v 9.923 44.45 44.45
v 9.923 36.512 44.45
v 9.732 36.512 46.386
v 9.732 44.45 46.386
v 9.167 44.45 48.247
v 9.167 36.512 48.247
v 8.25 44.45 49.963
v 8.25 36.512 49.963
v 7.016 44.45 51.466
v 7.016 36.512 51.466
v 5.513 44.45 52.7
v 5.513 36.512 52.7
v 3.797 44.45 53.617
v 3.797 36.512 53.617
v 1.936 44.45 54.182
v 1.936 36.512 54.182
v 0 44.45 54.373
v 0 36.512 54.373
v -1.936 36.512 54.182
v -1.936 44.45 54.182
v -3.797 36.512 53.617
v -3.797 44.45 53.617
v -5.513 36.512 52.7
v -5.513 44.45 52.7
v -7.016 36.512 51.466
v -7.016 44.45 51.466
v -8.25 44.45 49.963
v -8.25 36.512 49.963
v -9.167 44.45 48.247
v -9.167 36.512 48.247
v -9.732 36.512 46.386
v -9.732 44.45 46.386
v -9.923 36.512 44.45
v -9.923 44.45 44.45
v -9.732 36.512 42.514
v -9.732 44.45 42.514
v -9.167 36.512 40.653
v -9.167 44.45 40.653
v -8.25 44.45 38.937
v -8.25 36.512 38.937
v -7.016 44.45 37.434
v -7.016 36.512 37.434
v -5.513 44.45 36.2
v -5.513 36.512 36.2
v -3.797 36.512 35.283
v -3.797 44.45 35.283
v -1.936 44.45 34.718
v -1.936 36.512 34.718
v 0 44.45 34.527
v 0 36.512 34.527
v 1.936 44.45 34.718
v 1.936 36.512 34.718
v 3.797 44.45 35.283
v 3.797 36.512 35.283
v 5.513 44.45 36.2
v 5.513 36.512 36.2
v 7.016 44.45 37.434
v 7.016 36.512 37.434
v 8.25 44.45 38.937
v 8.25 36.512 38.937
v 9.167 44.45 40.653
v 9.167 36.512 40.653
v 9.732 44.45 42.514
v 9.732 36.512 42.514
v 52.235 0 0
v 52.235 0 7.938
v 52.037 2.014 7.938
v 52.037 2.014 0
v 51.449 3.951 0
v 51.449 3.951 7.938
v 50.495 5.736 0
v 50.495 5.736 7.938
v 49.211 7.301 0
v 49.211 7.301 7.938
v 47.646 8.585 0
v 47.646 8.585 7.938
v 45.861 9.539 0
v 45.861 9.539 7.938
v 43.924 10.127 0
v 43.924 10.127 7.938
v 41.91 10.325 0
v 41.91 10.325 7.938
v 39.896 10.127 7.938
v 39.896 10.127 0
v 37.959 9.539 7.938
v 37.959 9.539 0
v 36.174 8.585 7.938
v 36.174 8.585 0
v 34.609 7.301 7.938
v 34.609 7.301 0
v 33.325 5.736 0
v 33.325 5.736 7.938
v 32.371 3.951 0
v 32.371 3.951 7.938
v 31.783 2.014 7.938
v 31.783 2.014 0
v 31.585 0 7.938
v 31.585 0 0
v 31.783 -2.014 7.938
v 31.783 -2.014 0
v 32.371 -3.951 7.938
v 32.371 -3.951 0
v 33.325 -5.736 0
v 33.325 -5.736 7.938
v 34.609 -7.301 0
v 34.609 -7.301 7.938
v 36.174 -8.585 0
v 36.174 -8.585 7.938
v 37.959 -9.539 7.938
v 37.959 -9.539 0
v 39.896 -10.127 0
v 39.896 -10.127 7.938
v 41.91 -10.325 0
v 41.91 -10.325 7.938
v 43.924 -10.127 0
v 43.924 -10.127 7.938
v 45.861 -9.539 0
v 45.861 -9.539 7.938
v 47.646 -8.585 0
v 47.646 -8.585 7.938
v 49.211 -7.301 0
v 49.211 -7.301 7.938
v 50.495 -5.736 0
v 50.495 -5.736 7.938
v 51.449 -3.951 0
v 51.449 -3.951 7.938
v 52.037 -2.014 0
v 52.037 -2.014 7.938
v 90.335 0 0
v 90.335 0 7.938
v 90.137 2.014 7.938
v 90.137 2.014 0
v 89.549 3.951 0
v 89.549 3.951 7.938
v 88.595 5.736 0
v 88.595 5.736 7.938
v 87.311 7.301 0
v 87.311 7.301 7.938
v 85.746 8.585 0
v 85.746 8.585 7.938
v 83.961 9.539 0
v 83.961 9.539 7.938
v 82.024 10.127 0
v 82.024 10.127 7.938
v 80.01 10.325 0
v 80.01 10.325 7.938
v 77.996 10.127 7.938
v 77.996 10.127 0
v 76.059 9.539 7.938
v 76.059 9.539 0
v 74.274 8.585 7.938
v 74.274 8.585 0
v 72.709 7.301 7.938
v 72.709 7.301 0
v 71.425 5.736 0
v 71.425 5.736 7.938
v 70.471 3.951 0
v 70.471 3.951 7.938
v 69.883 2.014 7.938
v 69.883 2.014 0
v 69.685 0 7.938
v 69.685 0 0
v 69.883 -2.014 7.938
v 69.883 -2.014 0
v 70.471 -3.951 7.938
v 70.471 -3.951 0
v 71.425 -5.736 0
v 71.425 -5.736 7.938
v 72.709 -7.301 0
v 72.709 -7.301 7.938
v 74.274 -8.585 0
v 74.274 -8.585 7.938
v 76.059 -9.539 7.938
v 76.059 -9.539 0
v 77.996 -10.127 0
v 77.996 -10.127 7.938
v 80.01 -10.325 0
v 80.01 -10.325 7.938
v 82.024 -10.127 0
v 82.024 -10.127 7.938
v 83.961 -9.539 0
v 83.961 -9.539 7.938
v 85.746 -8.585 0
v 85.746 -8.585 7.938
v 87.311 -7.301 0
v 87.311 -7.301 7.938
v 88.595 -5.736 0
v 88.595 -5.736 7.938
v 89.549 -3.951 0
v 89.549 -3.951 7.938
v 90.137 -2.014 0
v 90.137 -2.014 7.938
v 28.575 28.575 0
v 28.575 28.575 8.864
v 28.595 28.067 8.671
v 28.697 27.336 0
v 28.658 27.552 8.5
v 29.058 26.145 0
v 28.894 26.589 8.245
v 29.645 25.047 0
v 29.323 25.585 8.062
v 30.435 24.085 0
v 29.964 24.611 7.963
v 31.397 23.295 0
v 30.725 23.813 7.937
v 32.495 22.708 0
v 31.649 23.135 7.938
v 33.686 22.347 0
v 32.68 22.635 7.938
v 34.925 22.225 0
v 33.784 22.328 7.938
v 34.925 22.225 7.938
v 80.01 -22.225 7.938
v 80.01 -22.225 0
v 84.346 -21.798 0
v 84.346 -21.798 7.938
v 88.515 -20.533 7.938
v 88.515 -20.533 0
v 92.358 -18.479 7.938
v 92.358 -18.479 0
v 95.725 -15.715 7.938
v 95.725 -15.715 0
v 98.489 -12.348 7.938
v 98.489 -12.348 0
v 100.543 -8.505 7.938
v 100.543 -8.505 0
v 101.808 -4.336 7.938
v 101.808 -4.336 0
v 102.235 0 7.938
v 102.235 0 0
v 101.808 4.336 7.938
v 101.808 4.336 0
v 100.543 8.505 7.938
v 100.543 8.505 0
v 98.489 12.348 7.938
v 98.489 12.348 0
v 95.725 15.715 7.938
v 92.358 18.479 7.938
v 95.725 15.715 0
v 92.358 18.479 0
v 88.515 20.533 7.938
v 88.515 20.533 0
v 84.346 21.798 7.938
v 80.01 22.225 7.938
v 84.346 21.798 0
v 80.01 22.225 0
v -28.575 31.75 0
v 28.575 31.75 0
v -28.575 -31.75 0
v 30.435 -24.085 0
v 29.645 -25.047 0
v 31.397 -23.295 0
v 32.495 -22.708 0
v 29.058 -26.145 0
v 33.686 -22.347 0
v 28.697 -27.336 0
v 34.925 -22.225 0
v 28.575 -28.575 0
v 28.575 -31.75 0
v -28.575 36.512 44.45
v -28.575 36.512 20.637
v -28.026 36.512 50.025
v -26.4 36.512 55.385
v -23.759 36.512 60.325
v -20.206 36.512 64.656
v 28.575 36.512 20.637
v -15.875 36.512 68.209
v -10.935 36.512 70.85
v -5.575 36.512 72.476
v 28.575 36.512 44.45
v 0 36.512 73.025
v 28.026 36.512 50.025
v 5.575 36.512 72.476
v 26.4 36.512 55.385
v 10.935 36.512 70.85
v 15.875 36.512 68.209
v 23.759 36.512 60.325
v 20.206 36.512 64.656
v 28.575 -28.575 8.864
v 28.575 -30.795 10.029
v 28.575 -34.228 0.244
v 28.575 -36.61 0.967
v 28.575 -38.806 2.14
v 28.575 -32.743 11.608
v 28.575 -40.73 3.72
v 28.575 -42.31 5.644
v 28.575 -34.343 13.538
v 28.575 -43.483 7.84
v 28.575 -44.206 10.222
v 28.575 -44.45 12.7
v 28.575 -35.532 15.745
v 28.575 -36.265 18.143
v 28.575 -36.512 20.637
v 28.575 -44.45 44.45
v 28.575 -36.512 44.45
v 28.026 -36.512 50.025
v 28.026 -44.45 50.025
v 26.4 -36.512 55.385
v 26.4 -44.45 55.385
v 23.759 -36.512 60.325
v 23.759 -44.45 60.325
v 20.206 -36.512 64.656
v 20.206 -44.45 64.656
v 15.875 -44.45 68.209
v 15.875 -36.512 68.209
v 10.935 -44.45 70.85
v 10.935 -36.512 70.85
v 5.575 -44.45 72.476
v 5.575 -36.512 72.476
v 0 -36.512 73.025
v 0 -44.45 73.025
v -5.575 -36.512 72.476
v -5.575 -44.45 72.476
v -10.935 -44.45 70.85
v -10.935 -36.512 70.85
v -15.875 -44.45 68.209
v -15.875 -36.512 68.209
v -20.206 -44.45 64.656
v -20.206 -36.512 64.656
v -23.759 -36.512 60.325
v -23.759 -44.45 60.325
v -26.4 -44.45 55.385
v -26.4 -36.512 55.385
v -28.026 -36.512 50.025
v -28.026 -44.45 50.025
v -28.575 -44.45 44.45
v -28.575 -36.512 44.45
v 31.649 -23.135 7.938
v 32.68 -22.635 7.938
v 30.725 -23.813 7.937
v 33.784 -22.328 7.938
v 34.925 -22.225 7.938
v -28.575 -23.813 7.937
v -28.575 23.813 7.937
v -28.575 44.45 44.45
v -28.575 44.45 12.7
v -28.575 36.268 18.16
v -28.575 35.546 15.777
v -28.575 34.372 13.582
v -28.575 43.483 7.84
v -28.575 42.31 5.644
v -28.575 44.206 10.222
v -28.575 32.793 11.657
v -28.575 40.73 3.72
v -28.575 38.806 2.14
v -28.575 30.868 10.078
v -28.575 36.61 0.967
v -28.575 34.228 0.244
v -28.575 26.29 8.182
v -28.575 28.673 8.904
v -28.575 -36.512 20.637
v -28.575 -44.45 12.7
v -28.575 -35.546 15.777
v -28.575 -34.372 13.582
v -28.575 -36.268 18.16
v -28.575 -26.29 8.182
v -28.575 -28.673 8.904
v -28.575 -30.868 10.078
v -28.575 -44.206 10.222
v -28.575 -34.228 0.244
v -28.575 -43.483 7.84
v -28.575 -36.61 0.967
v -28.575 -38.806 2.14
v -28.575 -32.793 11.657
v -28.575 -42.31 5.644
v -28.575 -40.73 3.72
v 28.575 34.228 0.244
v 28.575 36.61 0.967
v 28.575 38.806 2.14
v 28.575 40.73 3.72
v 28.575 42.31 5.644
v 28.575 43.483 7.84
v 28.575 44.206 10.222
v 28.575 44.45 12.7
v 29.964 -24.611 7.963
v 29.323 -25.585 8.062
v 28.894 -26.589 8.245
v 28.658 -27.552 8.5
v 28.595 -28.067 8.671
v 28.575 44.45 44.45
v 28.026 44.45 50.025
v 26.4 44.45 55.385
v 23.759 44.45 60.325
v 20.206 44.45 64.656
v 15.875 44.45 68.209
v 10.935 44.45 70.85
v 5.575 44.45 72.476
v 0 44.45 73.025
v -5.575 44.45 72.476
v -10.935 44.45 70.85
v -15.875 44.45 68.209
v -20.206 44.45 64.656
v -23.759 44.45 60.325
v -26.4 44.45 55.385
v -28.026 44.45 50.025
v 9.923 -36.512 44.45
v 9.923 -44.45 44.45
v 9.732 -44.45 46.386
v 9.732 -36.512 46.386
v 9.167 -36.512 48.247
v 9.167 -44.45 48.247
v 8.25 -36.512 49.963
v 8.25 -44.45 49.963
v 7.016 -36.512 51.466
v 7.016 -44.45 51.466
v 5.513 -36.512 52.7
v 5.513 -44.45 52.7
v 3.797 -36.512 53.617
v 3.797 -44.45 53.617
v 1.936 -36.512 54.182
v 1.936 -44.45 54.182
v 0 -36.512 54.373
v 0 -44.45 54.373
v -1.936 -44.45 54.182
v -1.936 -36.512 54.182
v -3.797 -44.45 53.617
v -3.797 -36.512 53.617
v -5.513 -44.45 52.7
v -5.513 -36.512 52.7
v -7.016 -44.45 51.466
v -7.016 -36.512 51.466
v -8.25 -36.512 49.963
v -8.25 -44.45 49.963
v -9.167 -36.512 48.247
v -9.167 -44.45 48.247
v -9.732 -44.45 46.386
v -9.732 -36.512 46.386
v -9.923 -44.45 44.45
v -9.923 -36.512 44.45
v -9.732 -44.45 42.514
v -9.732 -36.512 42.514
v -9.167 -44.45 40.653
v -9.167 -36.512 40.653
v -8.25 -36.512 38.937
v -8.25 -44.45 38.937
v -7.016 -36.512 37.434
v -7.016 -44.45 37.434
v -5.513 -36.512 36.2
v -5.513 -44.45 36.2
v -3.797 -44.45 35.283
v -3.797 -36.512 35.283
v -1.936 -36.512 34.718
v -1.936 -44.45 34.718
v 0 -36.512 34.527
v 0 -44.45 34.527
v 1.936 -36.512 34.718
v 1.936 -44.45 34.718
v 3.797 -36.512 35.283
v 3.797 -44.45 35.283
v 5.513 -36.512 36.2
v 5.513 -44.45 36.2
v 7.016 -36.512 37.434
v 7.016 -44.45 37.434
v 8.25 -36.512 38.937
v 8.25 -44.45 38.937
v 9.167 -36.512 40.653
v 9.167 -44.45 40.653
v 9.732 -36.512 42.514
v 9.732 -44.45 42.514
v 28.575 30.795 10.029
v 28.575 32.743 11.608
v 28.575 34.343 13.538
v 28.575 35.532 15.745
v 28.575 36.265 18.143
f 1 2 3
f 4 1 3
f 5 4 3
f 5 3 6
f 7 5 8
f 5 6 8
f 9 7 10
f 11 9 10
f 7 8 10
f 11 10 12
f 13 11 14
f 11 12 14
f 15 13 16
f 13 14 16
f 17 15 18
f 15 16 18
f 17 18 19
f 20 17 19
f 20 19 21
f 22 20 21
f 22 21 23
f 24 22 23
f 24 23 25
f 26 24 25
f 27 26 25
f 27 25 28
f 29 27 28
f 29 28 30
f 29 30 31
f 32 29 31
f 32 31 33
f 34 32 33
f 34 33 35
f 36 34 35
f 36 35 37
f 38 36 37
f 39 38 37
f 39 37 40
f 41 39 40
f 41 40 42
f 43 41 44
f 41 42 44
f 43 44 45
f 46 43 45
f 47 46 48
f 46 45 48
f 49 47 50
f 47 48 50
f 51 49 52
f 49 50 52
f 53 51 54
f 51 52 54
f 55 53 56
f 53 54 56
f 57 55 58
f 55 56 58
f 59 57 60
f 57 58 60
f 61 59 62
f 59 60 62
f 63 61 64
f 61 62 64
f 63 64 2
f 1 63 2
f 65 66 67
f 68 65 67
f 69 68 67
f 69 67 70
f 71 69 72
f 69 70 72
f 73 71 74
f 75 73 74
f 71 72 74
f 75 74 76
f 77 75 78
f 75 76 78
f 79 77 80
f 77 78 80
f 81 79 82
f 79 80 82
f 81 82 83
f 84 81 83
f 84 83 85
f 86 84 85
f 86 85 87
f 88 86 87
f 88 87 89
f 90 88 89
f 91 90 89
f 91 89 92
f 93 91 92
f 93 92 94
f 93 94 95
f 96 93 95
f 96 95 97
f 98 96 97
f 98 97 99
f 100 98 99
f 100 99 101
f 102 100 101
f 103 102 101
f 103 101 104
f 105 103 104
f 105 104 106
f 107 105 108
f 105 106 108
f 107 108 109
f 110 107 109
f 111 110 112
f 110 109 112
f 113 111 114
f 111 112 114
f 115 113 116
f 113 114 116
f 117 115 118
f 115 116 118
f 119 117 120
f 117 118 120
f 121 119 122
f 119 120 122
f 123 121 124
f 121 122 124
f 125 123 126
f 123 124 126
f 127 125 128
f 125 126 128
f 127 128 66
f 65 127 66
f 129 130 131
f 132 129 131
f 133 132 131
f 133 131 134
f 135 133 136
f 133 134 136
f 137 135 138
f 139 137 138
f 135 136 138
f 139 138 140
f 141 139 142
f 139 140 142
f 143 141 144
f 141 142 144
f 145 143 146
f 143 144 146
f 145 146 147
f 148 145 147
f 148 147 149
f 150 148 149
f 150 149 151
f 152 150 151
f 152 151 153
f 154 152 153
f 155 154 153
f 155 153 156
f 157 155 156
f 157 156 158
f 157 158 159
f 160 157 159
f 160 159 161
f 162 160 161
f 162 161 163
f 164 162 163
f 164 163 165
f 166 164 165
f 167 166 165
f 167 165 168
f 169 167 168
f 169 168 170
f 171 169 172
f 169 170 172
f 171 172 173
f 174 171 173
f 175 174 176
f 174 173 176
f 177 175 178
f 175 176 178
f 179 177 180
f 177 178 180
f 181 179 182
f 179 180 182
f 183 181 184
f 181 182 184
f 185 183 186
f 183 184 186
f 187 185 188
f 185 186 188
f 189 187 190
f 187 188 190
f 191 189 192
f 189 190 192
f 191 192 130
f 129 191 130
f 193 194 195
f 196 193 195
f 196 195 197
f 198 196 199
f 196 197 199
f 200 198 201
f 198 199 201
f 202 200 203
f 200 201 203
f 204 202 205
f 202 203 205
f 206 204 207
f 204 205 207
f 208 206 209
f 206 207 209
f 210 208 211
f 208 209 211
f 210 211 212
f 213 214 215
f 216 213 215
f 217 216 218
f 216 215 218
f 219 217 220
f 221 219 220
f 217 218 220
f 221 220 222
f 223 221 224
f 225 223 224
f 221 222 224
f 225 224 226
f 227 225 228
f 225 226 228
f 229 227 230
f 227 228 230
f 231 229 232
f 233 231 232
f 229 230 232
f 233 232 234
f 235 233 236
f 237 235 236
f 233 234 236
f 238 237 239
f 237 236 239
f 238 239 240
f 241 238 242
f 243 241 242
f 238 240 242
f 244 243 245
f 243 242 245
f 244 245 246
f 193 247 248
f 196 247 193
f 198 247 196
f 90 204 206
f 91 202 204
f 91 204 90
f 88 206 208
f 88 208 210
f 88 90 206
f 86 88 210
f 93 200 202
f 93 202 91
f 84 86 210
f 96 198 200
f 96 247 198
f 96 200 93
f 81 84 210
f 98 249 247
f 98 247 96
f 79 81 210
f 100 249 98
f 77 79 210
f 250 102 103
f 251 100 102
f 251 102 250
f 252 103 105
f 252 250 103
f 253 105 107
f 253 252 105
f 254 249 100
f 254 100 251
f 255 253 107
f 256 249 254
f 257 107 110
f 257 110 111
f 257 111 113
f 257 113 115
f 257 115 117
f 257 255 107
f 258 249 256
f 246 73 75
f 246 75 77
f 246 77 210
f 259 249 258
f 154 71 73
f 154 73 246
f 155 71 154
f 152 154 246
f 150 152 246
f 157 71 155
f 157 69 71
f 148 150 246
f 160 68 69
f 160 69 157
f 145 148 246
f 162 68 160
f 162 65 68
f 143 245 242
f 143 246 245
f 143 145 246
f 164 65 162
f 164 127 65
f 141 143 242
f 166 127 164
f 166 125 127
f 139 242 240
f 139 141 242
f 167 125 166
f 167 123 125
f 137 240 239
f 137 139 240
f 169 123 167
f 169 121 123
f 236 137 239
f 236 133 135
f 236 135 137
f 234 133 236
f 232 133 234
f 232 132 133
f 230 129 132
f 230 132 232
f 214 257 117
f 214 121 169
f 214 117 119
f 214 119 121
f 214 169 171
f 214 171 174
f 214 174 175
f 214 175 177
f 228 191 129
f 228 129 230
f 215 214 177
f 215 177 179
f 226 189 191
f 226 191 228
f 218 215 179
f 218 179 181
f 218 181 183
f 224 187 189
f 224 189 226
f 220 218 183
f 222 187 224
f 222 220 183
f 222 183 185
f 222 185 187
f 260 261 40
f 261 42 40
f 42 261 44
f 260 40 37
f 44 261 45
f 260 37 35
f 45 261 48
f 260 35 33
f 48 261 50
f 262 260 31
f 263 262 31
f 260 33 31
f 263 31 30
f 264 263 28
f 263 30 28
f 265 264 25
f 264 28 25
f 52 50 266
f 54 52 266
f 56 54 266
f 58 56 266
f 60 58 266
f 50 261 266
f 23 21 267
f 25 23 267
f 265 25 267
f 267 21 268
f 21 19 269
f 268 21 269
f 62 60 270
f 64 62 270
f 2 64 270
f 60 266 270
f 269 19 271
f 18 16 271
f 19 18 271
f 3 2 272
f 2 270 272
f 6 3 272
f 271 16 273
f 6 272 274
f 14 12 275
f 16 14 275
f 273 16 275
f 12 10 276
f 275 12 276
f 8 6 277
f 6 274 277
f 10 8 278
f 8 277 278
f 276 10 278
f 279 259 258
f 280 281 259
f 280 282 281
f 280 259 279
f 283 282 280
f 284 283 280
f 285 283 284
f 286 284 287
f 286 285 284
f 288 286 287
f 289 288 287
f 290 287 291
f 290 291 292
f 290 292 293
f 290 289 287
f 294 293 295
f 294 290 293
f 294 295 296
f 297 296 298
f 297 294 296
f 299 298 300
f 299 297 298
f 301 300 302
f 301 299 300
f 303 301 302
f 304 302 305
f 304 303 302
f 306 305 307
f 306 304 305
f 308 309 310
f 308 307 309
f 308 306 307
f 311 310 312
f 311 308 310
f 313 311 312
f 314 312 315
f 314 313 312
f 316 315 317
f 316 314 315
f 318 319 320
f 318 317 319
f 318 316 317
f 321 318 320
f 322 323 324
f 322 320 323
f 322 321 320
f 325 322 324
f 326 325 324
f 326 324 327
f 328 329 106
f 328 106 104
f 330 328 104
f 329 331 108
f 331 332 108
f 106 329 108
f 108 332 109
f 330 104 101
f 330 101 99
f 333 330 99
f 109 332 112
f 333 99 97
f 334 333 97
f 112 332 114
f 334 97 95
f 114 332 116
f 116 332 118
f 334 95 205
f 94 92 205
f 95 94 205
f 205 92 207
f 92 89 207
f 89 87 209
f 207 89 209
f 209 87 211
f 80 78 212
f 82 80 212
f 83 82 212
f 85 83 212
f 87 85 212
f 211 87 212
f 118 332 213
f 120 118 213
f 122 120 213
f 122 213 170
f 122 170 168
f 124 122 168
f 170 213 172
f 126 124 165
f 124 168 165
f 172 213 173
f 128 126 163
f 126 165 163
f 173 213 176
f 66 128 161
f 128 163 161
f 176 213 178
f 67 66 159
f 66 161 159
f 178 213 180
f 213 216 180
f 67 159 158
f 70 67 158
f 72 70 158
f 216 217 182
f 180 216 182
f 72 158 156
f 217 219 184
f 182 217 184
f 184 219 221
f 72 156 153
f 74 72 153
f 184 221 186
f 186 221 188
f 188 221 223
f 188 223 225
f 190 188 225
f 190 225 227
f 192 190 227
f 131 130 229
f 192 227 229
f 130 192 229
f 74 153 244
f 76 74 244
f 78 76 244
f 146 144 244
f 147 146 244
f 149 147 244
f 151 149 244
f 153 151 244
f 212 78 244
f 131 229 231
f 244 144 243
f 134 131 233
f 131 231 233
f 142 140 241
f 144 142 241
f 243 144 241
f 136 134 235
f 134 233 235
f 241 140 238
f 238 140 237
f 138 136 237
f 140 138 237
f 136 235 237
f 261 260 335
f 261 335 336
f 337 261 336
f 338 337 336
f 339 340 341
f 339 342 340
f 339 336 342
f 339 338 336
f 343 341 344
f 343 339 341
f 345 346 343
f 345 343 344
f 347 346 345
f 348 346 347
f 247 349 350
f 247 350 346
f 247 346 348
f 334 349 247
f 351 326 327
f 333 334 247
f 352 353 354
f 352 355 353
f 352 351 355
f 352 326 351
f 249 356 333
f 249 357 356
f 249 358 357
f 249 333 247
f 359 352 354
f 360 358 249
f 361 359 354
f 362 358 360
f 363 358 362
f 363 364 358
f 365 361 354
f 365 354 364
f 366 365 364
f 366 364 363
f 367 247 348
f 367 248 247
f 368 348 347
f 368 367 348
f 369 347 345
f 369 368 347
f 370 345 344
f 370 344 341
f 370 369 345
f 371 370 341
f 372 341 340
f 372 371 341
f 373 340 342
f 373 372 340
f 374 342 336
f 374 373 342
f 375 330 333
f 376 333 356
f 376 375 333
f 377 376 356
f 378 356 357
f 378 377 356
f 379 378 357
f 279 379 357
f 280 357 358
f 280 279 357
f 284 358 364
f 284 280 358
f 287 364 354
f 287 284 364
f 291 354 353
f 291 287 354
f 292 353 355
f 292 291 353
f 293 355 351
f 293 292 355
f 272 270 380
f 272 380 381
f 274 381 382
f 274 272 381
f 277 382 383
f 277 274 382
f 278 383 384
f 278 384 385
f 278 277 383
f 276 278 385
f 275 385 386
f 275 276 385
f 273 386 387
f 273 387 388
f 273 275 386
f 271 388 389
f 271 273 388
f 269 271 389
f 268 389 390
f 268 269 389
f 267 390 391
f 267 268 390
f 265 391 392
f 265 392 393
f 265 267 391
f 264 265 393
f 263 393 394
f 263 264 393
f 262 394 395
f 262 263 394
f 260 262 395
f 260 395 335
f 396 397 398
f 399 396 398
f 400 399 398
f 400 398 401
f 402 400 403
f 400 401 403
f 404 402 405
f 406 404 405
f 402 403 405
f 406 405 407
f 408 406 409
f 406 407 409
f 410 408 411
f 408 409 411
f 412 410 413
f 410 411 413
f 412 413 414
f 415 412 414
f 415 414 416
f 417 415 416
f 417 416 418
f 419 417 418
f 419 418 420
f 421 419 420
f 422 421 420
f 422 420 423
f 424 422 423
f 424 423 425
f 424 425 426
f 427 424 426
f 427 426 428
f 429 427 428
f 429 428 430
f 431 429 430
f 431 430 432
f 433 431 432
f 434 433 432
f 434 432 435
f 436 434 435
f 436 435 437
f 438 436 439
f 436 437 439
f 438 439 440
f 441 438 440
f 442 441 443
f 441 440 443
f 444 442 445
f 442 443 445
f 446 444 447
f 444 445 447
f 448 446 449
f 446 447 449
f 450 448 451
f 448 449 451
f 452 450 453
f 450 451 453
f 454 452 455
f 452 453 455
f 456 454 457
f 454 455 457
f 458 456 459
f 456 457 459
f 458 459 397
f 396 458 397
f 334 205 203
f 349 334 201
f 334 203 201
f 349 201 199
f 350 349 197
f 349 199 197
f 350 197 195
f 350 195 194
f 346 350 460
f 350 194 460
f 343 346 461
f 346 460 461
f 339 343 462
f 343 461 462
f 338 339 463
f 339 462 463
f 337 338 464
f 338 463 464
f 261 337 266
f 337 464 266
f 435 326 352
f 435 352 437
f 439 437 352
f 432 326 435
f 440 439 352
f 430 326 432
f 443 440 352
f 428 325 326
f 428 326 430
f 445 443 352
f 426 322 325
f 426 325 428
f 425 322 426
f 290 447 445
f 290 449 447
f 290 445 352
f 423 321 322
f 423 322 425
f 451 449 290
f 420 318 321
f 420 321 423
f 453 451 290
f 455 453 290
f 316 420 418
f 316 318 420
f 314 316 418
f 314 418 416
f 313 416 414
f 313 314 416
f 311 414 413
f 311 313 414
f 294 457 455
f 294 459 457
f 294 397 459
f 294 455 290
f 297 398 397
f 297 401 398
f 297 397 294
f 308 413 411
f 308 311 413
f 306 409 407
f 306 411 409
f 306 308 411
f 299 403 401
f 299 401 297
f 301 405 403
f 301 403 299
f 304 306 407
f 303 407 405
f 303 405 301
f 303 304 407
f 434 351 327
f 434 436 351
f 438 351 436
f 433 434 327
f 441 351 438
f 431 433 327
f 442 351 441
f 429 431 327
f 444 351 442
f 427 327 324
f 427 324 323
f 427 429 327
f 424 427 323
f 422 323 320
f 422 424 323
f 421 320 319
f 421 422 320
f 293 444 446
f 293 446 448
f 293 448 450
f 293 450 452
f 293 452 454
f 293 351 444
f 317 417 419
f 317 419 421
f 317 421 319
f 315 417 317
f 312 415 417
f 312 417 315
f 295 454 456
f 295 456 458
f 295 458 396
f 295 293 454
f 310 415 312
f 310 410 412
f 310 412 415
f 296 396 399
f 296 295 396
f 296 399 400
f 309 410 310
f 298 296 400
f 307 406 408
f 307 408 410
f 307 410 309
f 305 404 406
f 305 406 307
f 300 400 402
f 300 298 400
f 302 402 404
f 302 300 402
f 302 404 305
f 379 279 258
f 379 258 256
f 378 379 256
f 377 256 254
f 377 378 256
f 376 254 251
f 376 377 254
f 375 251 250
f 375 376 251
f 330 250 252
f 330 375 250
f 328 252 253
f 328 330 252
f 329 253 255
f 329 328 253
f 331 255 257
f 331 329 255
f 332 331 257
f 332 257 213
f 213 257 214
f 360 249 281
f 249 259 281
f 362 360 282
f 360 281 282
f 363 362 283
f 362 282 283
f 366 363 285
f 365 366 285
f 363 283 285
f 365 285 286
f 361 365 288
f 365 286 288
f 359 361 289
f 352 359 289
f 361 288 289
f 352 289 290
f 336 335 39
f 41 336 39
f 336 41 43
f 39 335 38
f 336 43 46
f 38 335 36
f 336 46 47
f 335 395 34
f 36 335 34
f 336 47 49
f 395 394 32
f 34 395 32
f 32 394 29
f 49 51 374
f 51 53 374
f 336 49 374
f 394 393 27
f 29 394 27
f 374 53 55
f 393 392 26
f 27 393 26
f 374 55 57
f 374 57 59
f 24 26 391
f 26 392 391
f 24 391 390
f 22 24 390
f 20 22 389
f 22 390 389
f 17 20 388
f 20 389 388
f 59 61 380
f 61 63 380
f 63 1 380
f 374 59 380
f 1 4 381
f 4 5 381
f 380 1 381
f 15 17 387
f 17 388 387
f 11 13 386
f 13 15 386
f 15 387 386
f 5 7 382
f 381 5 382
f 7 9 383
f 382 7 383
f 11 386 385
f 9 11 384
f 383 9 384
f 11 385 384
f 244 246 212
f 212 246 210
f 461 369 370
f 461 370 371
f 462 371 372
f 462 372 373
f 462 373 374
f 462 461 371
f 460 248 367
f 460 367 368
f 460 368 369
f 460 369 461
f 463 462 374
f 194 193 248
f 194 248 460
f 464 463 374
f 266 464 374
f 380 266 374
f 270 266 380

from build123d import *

# Parameters (mm, degrees)
F1_DEPTH      = 44.45
F2_W          = 73.025
F2_H          = 65.0875
F3_DEPTH      = 28.576
F3_DEPTH_BACK = 28.576
F4_R          = 9.92251
F5_DEPTH      = 88.901
F7_DEPTH      = 7.9375
F8_R          = 10.3251
F9_DEPTH      = 7.9385
F10_R         = 6.35
F11_R         = 12.7


with BuildPart() as f1:
    # F0 (on Front) → F1 (new body, symmetric)
    with BuildSketch(Plane.XZ):
        with BuildLine():
            Line((-28.575, 44.45), (-28.575, 0))
            Line((-28.575, 0), (28.575, 0))
            Line((28.575, 0), (28.575, 44.45))
            ThreePointArc((28.575, 44.45), (0, 73.025), (-28.575, 44.45))
        make_face()
    extrude(amount=F1_DEPTH, both=True)

    # F2 (on Right) → F3 (cut, two sides)
    with BuildSketch(Plane.YZ) as f3_sk:
        with Locations((0, 40.48125)):
            Rectangle(F2_W, F2_H)
    extrude(amount=-F3_DEPTH, mode=Mode.SUBTRACT)
    extrude(f3_sk.sketch, amount=F3_DEPTH_BACK, mode=Mode.SUBTRACT)

    # F4 (on face) → F5 (cut, through all)
    with BuildSketch(Plane.XZ.offset(44.45)):
        with Locations((0, 44.45)):
            Circle(F4_R)
    extrude(amount=-F5_DEPTH, mode=Mode.SUBTRACT)

    # F6 (on Top) → F7 (join)
    with BuildSketch(Plane.XY):
        with BuildLine():
            Line((80.01, 22.225), (28.575, 22.225))
            Line((28.575, 22.225), (28.575, -22.225))
            Line((28.575, -22.225), (80.01, -22.225))
            ThreePointArc((80.01, -22.225), (102.235, 0), (80.01, 22.225))
        make_face()
    extrude(amount=F7_DEPTH)

    # F8 (on face) → F9 (cut, through all)
    with BuildSketch(Plane.XY.offset(7.9375)):
        with Locations((41.91, 0)):
            Circle(F8_R)
        with Locations((80.01, 0)):
            Circle(F8_R)
    extrude(amount=-F9_DEPTH, mode=Mode.SUBTRACT)

    # F10
    f10_edges = [f1.edges().sort_by_distance(p)[0] for p in [
        (28.575, -22.225, 3.96875),
        (28.575, 22.225, 3.96875),
    ]]
    fillet(f10_edges, radius=F10_R)

    # F11
    f11_edges = [f1.edges().sort_by_distance(p)[0] for p in [
        (0, -36.5125, 7.9375),
        (0, 36.5125, 7.9375),
        (0, -44.45, 0),
        (0, 44.45, 0),
    ]]
    fillet(f11_edges, radius=F11_R)


solid = f1.part
